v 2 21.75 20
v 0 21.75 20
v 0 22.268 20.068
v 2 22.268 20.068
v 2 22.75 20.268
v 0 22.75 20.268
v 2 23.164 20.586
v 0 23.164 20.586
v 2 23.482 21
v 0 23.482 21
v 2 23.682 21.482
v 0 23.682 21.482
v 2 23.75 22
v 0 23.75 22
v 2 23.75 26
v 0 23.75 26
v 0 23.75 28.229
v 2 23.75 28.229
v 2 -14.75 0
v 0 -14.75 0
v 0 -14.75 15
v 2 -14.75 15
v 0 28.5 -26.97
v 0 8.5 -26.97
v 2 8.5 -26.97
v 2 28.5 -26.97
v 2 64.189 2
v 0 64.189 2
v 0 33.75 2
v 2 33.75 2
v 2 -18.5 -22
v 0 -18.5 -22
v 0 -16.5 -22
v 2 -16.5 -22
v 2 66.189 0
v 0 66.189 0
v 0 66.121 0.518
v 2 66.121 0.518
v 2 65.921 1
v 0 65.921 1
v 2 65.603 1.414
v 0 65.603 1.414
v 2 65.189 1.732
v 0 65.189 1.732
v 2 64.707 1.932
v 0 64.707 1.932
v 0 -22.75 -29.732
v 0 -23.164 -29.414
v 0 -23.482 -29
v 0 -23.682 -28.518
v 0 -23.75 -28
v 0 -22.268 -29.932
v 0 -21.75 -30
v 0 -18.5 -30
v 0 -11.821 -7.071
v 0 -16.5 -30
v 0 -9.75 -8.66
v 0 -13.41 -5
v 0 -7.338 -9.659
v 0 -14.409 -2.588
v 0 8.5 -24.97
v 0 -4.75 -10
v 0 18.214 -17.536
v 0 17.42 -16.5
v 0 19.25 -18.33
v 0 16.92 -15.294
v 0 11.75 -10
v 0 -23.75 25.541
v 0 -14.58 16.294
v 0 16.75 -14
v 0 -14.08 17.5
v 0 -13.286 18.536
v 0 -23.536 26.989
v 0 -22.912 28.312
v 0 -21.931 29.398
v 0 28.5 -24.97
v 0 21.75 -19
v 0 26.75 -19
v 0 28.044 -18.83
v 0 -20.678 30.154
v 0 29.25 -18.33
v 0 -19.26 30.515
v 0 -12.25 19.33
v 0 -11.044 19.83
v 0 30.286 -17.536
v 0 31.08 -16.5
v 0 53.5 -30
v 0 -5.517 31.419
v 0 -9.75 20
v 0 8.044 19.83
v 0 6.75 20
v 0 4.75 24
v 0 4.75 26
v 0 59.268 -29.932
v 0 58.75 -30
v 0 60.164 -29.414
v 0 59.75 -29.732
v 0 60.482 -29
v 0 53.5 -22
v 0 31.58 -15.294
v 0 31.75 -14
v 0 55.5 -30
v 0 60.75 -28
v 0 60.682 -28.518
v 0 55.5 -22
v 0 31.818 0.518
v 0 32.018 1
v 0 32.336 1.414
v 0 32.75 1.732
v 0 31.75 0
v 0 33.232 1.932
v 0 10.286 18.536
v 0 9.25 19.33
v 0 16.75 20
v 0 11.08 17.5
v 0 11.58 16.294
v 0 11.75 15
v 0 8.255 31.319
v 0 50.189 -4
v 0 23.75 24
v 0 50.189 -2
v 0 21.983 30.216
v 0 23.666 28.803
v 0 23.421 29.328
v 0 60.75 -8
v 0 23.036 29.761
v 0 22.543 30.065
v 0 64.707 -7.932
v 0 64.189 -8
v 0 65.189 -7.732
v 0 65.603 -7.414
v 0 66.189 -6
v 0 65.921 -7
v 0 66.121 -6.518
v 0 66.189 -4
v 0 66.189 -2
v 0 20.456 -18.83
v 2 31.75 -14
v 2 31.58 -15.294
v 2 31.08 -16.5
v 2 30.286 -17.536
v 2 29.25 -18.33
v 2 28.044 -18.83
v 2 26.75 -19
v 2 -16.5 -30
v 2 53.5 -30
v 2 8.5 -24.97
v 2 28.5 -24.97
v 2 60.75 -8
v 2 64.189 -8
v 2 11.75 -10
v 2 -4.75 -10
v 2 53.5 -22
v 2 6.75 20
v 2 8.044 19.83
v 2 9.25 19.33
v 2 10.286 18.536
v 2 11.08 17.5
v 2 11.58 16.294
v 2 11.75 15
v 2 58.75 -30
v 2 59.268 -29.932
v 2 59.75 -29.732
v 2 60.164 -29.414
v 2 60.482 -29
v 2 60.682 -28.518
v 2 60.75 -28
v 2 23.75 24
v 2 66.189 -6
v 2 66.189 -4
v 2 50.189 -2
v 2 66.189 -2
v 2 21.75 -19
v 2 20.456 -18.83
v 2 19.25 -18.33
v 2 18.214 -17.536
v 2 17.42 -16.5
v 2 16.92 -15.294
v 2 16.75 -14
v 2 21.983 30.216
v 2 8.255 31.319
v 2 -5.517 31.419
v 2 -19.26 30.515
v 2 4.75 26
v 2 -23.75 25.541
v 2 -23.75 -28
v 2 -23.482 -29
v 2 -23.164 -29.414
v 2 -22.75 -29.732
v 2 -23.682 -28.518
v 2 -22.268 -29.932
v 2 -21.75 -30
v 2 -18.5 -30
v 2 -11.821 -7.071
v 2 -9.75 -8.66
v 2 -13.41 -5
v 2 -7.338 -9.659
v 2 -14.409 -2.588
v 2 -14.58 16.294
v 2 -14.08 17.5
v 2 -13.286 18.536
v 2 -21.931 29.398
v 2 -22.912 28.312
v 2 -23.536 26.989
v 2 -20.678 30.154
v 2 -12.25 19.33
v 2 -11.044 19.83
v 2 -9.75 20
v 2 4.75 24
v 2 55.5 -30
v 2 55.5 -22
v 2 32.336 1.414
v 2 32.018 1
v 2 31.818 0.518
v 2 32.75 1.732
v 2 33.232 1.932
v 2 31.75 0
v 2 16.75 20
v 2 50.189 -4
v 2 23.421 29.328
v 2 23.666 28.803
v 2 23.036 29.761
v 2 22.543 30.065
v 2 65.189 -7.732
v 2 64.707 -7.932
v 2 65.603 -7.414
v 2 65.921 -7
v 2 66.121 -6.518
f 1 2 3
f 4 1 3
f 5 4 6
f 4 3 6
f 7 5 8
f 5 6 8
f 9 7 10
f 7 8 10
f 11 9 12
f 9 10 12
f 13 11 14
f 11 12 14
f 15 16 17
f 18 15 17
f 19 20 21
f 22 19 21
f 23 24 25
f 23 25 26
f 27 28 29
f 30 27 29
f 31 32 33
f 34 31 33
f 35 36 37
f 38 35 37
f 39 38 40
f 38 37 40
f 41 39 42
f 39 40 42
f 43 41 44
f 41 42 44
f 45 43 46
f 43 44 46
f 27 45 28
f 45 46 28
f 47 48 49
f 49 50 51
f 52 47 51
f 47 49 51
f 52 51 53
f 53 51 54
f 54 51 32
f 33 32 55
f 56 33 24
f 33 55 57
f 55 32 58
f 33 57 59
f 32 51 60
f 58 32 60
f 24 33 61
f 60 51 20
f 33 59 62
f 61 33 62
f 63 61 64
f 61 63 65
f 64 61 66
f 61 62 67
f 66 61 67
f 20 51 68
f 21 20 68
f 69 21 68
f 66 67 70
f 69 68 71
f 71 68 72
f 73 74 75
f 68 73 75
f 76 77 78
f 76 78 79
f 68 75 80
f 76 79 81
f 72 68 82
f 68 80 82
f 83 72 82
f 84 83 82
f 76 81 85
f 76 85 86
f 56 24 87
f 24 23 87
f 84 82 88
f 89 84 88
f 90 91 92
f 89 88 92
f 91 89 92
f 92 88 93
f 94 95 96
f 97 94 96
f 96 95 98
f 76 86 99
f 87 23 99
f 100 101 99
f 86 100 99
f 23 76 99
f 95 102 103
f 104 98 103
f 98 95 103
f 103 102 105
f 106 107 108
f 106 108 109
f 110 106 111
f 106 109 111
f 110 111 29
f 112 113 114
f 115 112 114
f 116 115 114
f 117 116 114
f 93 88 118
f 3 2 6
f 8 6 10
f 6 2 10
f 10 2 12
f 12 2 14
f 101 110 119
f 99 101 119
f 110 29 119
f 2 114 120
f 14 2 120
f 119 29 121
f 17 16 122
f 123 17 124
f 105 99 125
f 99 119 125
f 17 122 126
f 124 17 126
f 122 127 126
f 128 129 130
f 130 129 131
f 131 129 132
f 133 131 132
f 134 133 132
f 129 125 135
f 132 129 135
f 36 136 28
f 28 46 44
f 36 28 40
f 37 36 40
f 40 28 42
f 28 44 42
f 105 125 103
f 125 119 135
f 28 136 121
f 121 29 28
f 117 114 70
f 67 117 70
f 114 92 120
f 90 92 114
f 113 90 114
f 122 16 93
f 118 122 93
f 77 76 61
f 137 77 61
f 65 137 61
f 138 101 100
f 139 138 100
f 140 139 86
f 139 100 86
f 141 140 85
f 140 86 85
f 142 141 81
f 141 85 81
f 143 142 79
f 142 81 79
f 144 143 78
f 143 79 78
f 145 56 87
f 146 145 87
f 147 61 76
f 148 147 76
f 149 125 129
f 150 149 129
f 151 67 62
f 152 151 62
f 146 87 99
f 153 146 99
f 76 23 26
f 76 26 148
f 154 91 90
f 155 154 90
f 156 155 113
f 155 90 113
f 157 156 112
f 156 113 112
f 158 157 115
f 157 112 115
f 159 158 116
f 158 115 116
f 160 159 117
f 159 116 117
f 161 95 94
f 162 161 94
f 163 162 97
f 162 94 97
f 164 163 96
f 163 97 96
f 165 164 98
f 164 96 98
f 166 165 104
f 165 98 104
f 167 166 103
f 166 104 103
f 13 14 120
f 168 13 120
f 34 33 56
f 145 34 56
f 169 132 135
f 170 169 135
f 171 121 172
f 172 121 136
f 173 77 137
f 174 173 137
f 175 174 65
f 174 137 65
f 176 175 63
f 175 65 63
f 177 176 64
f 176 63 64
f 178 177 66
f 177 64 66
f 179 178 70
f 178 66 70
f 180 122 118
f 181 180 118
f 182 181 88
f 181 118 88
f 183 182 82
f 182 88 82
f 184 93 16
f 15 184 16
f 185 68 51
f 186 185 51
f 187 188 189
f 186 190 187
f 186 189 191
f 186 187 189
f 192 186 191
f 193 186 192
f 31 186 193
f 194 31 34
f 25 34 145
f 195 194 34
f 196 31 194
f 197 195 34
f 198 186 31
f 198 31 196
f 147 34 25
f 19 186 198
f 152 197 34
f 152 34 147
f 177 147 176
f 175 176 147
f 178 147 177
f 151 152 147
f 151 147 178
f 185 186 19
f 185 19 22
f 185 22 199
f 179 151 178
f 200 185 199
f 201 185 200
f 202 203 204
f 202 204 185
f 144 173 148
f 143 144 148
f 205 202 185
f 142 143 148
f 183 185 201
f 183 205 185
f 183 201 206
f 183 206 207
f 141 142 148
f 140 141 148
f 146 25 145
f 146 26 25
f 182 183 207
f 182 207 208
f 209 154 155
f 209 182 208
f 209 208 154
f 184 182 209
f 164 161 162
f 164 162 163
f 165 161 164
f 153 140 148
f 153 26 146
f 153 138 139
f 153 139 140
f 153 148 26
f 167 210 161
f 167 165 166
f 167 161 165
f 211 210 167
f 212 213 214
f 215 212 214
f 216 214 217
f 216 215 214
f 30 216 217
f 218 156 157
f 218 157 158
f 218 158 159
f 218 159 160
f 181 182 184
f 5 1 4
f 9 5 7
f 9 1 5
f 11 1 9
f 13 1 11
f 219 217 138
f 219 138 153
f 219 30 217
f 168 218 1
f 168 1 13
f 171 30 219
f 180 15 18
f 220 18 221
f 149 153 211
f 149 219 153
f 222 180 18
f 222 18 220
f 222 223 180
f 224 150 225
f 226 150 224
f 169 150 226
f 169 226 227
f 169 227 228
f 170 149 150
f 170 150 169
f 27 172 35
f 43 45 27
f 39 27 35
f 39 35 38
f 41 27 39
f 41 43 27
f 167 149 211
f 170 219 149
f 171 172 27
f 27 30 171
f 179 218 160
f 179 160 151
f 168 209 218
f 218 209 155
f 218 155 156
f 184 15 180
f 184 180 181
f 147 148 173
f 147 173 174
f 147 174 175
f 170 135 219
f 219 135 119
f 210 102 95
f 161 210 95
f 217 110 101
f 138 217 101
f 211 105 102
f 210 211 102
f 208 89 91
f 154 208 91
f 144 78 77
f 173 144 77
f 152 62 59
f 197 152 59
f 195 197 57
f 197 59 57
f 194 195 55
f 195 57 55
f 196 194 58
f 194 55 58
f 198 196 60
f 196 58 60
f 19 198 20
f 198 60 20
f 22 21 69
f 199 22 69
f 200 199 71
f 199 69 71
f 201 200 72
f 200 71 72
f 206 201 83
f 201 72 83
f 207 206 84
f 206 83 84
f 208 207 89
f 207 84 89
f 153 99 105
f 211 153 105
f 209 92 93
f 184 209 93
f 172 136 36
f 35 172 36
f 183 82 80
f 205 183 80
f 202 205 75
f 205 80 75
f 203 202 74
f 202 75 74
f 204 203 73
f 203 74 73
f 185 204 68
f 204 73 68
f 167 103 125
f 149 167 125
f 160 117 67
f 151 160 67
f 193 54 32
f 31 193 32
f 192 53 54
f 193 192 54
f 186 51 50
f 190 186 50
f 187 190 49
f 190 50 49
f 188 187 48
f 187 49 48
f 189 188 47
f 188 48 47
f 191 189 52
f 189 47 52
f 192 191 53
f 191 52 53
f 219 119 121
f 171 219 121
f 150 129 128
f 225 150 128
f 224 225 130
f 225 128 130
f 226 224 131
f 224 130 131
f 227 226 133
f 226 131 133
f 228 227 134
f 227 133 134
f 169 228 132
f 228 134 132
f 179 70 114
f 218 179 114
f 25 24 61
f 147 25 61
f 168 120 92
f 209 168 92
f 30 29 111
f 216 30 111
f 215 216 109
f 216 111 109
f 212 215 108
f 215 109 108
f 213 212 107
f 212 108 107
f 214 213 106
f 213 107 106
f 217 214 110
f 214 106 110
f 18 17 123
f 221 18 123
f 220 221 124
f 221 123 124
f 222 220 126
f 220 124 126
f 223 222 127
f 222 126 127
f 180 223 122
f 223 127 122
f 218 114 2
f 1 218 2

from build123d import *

# Parameters (mm, degrees)
F0_W     = 20
F0_H     = 2
F1_DEPTH = 2


with BuildPart() as f1:
    # F0 (on Right) → F1 (new body)
    with BuildSketch(Plane.YZ):
        with BuildLine():
            ThreePointArc((-23.75, -28), (-23.164214, -29.414214), (-21.75, -30))
            Line((-21.75, -30), (-18.5, -30))
            Line((-18.5, -30), (-18.5, -22))
            Line((-18.5, -22), (-16.5, -22))
            Line((-16.5, -22), (-16.5, -30))
            Line((-16.5, -30), (23.75, -30))
            Line((23.75, -30), (53.5, -30))
            Line((53.5, -30), (53.5, -22))
            Line((53.5, -22), (55.5, -22))
            Line((55.5, -22), (55.5, -30))
            Line((55.5, -30), (58.75, -30))
            ThreePointArc((58.75, -30), (60.164214, -29.414214), (60.75, -28))
            Line((60.75, -28), (60.75, -8))
            Line((60.75, -8), (64.188984, -8))
            ThreePointArc((64.188984, -8), (65.603197, -7.414214), (66.188984, -6))
            Line((66.188984, -6), (66.188984, -4))
            Line((66.188984, -4), (50.188984, -4))
            Line((50.188984, -4), (50.188984, -2))
            Line((50.188984, -2), (66.188984, -2))
            Line((66.188984, -2), (66.188984, 0))
            ThreePointArc((66.188984, 0), (65.603197, 1.414214), (64.188984, 2))
            Line((64.188984, 2), (33.75, 2))
            ThreePointArc((33.75, 2), (32.335786, 1.414214), (31.75, 0))
            Line((31.75, 0), (31.75, -14))
            ThreePointArc((31.75, -14), (30.285534, -17.535534), (26.75, -19))
            Line((26.75, -19), (21.75, -19))
            ThreePointArc((21.75, -19), (18.214466, -17.535534), (16.75, -14))
            Line((16.75, -14), (16.75, 20))
            Line((16.75, 20), (21.75, 20))
            ThreePointArc((21.75, 20), (23.164214, 20.585786), (23.75, 22))
            Line((23.75, 22), (23.75, 24))
            Line((23.75, 24), (4.75, 24))
            Line((4.75, 24), (4.75, 26))
            Line((4.75, 26), (23.75, 26))
            Line((23.75, 26), (23.75, 28.229252))
            ThreePointArc((23.75, 28.229252), (23.244291, 29.558573), (21.982906, 30.215645))
            ThreePointArc((21.982906, 30.215645), (1.369577, 31.495032), (-19.260146, 30.51488))
            ThreePointArc((-19.260146, 30.51488), (-22.461518, 28.891292), (-23.75, 25.540973))
            Line((-23.75, 25.540973), (-23.75, -28))
        make_face()
        with Locations((18.5, -25.970025)):
            Rectangle(F0_W, F0_H, mode=Mode.SUBTRACT)
        with BuildLine():
            ThreePointArc((-14.75, 15), (-13.285534, 18.535534), (-9.75, 20))
            Line((-9.75, 20), (6.75, 20))
            ThreePointArc((6.75, 20), (10.285534, 18.535534), (11.75, 15))
            Line((11.75, 15), (11.75, -10))
            Line((11.75, -10), (-4.75, -10))
            ThreePointArc((-4.75, -10), (-11.821068, -7.071068), (-14.75, 0))
            Line((-14.75, 0), (-14.75, 15))
        make_face(mode=Mode.SUBTRACT)
    extrude(amount=F1_DEPTH)


solid = f1.part
